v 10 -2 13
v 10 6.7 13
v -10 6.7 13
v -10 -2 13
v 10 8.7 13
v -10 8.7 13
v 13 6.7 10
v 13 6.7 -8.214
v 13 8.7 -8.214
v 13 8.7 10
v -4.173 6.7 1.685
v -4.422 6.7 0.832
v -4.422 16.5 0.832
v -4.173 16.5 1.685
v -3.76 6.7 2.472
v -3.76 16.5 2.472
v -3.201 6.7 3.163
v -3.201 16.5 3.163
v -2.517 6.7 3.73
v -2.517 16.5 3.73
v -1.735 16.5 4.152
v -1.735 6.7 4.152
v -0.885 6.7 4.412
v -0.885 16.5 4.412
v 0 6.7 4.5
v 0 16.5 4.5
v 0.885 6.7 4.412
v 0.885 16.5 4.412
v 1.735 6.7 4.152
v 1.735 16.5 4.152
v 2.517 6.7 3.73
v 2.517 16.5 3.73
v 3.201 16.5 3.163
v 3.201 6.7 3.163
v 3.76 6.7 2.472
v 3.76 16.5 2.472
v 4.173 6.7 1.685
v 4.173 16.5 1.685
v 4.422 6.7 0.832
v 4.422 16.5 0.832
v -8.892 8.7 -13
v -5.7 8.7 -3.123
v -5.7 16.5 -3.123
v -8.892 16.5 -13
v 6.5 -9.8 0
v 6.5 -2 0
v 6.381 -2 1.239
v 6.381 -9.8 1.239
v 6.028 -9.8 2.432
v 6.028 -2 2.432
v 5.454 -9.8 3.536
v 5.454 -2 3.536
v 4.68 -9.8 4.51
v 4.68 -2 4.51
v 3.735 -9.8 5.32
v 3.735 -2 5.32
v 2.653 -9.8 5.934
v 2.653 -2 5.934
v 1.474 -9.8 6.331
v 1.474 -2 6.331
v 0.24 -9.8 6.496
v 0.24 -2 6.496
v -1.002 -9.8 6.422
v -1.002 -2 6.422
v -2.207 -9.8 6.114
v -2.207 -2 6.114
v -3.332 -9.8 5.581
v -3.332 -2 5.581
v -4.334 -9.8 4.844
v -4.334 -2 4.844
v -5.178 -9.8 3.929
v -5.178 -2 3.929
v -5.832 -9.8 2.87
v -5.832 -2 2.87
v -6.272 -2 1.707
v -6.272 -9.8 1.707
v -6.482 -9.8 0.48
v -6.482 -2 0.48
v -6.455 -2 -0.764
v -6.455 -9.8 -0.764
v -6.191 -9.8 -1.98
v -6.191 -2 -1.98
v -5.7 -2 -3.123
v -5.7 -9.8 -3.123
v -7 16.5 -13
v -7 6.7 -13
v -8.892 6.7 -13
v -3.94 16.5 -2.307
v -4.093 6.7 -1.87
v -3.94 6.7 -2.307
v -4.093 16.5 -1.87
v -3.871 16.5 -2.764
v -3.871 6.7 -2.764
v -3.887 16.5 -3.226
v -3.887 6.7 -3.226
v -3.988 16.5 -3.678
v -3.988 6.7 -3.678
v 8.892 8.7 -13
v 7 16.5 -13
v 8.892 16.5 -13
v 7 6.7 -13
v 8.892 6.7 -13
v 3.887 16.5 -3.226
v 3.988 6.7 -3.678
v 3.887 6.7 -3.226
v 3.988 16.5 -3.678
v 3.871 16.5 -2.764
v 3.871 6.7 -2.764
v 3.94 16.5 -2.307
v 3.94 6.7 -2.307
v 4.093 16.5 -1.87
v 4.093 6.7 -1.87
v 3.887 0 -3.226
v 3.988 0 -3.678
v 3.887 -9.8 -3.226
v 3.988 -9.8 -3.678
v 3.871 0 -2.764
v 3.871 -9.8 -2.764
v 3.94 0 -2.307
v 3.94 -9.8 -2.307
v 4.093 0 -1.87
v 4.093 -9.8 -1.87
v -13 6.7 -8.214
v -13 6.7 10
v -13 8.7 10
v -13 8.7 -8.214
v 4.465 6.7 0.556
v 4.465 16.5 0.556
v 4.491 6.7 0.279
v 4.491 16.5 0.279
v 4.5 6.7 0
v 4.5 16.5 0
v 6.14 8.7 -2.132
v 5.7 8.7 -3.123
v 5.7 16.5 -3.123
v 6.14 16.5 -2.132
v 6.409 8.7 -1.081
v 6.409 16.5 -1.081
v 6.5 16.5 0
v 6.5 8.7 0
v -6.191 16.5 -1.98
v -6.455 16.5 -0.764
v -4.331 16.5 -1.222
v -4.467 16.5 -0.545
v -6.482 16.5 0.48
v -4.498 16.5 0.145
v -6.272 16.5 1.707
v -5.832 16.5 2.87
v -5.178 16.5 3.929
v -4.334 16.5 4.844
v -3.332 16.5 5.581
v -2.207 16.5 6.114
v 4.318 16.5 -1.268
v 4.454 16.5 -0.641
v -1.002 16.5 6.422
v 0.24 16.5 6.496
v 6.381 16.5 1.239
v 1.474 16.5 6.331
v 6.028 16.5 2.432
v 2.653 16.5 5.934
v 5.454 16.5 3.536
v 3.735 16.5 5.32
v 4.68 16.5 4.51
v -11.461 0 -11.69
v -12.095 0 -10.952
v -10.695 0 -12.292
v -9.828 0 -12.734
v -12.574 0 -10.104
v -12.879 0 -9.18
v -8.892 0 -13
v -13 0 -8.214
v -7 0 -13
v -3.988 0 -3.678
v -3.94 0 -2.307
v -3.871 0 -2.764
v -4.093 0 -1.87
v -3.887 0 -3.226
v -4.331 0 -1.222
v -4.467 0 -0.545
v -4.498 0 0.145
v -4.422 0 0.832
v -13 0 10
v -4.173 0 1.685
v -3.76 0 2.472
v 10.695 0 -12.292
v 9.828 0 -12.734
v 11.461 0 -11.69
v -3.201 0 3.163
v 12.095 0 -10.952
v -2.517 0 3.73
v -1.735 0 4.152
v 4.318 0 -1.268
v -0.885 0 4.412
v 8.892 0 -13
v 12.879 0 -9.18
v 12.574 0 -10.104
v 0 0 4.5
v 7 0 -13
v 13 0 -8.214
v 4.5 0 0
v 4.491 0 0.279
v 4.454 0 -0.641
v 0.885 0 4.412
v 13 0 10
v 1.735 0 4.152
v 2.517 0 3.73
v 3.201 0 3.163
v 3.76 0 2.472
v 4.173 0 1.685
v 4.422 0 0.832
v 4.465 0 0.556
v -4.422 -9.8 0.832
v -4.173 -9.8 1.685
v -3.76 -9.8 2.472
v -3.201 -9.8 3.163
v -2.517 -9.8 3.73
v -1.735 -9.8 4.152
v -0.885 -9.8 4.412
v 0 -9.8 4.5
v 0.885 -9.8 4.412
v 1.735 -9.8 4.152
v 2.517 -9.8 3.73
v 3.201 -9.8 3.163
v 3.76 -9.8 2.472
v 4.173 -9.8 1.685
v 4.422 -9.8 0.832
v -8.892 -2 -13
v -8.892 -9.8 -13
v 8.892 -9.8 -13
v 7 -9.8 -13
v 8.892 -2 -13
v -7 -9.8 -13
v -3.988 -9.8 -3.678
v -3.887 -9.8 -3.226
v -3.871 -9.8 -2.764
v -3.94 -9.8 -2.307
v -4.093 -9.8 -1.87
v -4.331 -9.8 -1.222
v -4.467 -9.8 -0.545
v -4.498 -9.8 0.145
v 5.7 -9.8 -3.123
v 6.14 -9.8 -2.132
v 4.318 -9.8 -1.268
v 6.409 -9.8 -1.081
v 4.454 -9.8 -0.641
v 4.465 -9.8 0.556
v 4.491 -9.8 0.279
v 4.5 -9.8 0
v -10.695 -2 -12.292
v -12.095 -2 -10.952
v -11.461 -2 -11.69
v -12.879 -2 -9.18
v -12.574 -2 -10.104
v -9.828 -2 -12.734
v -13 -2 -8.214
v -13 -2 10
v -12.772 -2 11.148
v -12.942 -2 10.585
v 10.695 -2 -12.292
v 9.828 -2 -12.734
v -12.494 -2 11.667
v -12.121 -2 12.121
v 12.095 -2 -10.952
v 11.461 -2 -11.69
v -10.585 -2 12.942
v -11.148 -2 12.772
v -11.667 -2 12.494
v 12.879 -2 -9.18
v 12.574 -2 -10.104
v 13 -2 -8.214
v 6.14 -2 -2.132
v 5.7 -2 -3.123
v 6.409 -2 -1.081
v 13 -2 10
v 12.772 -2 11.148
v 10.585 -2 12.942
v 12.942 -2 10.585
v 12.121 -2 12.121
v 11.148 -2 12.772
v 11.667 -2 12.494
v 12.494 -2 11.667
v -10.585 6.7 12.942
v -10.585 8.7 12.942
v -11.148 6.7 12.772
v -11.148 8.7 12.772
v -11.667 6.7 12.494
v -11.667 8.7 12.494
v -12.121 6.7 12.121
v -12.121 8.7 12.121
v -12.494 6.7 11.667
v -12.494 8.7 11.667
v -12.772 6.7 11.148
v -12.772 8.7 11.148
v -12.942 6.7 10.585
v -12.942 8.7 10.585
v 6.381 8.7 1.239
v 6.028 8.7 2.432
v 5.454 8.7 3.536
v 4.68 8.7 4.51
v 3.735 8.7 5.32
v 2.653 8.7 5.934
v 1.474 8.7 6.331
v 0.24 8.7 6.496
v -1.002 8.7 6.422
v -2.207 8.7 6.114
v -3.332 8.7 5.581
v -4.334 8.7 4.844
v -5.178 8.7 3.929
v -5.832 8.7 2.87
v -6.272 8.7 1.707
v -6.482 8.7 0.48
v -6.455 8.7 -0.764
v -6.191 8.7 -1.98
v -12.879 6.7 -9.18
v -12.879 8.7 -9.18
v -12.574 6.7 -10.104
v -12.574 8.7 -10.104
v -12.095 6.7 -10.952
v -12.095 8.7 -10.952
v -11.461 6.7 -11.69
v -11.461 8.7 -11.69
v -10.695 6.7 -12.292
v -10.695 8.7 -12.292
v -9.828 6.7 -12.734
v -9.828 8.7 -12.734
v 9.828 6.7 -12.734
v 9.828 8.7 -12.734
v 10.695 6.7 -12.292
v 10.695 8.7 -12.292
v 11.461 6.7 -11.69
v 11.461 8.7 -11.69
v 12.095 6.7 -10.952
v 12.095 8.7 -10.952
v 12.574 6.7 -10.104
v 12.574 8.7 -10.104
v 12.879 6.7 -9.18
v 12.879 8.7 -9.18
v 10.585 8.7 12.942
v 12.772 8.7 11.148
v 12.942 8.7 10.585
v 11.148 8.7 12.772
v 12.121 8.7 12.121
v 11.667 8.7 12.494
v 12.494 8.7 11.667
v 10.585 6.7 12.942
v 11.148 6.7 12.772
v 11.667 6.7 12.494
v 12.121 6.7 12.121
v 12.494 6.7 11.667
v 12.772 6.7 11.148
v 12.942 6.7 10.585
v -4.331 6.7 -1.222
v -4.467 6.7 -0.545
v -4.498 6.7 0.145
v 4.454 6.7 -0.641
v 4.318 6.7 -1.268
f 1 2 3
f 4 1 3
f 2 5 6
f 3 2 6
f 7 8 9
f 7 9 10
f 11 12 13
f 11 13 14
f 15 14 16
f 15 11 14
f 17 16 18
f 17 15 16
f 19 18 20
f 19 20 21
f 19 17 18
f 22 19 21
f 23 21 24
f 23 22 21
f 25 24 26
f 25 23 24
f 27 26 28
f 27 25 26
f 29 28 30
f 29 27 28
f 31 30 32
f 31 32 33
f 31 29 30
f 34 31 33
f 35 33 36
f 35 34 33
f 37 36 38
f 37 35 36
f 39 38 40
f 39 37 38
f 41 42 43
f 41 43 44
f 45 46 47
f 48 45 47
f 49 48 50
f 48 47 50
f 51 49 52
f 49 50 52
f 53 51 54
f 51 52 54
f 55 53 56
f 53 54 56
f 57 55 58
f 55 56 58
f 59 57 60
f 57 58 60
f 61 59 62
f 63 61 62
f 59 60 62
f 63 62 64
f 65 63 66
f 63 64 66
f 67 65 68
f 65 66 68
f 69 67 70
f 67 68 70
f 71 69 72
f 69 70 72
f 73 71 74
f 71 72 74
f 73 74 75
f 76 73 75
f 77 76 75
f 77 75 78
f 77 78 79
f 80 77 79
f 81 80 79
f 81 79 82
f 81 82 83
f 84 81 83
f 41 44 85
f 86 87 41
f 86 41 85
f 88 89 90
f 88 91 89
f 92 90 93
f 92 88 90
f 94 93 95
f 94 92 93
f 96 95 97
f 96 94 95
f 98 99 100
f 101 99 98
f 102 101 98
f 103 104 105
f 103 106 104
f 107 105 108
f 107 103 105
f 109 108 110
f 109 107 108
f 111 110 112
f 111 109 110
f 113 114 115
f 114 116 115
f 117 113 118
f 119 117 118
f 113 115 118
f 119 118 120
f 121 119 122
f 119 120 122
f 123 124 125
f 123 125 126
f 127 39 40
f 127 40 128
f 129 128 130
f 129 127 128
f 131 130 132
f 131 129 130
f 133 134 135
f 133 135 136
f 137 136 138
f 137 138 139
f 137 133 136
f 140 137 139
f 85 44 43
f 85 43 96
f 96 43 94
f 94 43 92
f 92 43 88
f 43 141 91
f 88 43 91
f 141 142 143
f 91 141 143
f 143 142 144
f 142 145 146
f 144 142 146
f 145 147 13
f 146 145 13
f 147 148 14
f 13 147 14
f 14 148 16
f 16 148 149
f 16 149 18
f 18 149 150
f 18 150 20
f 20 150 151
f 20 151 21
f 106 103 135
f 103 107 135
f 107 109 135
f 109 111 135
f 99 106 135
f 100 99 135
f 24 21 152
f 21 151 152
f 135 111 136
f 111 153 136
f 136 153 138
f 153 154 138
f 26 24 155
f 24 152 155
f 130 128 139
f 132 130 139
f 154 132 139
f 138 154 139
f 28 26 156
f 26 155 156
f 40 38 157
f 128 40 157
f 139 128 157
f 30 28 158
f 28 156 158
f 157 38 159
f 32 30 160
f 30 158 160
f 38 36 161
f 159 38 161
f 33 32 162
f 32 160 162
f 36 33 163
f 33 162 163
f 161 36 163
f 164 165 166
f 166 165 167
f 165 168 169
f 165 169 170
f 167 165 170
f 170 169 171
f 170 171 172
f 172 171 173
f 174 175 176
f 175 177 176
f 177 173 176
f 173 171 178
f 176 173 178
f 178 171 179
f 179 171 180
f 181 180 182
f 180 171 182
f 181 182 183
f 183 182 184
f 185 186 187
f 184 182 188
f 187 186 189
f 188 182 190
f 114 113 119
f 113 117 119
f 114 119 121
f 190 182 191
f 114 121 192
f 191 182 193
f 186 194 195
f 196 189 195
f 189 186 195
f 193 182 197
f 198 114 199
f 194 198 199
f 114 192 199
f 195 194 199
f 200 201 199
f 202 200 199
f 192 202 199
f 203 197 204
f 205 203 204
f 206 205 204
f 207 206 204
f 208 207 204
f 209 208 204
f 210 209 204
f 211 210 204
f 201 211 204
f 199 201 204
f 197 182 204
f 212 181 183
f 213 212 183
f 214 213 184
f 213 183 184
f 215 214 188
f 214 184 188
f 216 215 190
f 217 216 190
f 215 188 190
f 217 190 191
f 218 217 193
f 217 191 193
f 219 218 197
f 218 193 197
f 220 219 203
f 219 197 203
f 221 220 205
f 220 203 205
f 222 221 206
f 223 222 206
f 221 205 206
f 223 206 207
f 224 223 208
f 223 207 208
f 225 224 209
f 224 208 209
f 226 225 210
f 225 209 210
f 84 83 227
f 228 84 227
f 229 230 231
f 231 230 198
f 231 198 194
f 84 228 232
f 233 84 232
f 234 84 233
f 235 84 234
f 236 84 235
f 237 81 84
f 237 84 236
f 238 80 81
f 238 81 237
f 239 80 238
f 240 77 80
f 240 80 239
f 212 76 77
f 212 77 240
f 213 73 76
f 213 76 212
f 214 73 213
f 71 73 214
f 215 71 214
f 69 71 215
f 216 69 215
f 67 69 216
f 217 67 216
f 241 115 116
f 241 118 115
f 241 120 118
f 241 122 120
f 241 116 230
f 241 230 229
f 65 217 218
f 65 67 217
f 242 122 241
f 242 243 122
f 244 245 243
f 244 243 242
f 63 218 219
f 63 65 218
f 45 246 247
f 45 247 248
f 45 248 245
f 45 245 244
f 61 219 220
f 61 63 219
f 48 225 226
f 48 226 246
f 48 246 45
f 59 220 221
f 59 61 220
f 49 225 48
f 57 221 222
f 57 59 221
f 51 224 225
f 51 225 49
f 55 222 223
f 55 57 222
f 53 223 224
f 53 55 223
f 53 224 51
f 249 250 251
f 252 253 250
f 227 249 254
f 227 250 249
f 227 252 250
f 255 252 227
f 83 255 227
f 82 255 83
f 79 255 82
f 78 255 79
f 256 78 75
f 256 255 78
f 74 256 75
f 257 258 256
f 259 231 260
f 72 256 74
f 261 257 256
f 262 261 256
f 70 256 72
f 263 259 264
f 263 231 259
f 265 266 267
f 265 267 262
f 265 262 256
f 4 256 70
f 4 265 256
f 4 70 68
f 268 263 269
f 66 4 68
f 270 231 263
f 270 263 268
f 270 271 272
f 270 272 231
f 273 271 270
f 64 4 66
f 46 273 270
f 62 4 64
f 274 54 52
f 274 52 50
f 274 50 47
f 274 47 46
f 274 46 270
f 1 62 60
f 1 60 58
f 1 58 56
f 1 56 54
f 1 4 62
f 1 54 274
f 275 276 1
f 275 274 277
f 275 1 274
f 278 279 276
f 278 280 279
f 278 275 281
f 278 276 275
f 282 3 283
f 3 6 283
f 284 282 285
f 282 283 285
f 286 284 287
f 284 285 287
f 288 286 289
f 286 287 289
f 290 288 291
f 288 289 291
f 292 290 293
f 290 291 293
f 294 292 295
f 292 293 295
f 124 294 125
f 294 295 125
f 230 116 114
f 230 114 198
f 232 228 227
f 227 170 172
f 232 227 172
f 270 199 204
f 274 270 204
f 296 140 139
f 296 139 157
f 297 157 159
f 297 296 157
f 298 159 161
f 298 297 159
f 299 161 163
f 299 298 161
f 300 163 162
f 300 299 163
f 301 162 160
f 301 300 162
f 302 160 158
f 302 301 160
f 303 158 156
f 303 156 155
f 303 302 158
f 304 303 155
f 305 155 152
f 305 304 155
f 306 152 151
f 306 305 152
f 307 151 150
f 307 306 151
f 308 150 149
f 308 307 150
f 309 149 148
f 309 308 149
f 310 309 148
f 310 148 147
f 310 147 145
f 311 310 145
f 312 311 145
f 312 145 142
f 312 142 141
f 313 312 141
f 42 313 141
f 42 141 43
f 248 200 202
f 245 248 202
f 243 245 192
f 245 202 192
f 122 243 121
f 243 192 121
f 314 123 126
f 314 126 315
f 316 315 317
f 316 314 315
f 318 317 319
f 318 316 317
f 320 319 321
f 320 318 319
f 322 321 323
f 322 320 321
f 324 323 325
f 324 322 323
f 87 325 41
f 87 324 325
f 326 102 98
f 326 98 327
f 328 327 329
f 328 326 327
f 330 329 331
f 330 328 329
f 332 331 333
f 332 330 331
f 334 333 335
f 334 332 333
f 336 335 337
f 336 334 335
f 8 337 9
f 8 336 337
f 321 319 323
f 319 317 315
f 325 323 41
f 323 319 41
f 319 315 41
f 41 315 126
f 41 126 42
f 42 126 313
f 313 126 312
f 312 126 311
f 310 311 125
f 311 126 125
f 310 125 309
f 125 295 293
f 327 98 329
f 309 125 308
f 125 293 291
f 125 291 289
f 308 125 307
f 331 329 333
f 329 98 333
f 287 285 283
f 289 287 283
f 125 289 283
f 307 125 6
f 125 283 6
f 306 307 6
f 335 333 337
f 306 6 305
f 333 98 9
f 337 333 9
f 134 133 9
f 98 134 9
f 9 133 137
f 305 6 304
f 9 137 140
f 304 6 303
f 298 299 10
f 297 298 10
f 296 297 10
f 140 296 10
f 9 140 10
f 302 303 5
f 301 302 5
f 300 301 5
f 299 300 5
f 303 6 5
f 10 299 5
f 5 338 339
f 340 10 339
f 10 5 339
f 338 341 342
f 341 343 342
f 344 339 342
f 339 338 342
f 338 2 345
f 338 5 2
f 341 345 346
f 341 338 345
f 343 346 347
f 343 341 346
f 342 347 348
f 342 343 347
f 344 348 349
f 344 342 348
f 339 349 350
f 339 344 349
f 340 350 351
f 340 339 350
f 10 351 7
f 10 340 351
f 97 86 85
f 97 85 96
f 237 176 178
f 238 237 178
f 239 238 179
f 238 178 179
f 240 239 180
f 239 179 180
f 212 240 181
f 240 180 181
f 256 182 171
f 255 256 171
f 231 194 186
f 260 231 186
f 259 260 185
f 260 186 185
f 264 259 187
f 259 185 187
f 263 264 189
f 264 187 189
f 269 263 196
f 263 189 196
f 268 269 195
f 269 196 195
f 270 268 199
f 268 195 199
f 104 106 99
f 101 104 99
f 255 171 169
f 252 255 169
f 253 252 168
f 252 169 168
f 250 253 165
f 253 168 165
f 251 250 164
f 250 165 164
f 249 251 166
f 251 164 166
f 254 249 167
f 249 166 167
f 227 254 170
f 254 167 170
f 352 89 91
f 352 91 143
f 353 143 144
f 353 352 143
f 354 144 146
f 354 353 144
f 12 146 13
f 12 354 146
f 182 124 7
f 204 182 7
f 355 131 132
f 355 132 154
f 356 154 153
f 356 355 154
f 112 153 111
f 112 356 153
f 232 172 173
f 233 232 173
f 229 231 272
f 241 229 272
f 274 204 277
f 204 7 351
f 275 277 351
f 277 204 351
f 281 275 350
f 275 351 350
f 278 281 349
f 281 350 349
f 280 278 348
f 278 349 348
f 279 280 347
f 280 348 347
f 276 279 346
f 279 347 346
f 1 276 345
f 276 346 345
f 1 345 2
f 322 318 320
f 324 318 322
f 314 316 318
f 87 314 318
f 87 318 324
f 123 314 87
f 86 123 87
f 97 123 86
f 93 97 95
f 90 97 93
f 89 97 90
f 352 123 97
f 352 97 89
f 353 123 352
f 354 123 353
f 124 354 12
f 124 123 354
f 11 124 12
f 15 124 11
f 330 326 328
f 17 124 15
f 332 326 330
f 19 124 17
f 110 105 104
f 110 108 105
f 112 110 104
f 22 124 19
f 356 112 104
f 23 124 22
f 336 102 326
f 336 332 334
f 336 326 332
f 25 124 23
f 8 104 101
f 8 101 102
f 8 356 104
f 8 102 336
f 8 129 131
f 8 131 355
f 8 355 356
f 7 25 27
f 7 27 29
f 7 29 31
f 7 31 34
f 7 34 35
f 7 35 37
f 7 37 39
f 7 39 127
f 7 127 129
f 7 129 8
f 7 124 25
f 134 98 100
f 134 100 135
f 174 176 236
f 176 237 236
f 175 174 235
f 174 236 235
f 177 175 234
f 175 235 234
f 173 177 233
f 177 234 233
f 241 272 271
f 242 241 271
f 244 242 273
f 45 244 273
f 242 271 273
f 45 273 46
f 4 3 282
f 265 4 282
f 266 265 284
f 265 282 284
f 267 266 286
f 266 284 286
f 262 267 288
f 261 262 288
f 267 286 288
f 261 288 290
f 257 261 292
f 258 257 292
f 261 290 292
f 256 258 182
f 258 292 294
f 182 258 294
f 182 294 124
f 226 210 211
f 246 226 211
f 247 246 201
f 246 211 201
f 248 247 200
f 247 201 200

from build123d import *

# Parameters (mm, degrees)
F1_DEPTH = 9.8
F2_DEPTH = 2
F3_R     = 3
F5_DEPTH = 3.35
F7_R     = 2.5


with BuildPart() as f1:
    # F0 (on Front) → F1 (new body)
    with BuildSketch(Plane.XZ):
        with BuildLine():
            ThreePointArc((6.5, 0), (-1.6120548351, 6.2969261714), (-5.7003936026, -3.1233816249))
            Line((-5.7003936026, -3.1233816249), (-4.4224832798, 0.8316499504))
            ThreePointArc((-4.4224832798, 0.8316499504), (0, 4.5), (4.4224832798, 0.8316499504))
            Line((4.4224832798, 0.8316499504), (5.7003936026, -3.1233816249))
            ThreePointArc((5.7003936026, -3.1233816249), (6.2969261714, -1.6120548351), (6.5, 0))
        make_face()
        with BuildLine():
            Line((-4.4224832798, 0.8316499504), (-5.7003936026, -3.1233816249))
            ThreePointArc((-5.7003936026, -3.1233816249), (-5.1003989607, -4.0293833824), (-4.3578547765, -4.8227690953))
            Line((-4.3578547765, -4.8227690953), (-3.65, -2.6320144377))
            ThreePointArc((-3.65, -2.6320144377), (-4.3920939566, -0.9795461582), (-4.4224832798, 0.8316499504))
        make_face()
        with BuildLine():
            Line((-5.7003936026, -3.1233816249), (-8.891627942, -13))
            Line((-8.891627942, -13), (-7, -13))
            Line((-7, -13), (-4.3578547765, -4.8227690953))
            ThreePointArc((-4.3578547765, -4.8227690953), (-5.1003989607, -4.0293833824), (-5.7003936026, -3.1233816249))
        make_face()
        with BuildLine():
            Line((7, -13), (8.891627942, -13))
            Line((8.891627942, -13), (5.7003936026, -3.1233816249))
            ThreePointArc((5.7003936026, -3.1233816249), (5.1003989607, -4.0293833824), (4.3578547765, -4.8227690953))
            Line((4.3578547765, -4.8227690953), (7, -13))
        make_face()
        with BuildLine():
            ThreePointArc((4.3578547765, -4.8227690953), (5.1003989607, -4.0293833824), (5.7003936026, -3.1233816249))
            Line((5.7003936026, -3.1233816249), (4.4224832798, 0.8316499504))
            ThreePointArc((4.4224832798, 0.8316499504), (4.4805789112, 0.4176273704), (4.5, 0))
            ThreePointArc((4.5, 0), (4.2822307271, -1.3829316686), (3.65, -2.6320144377))
            Line((3.65, -2.6320144377), (4.3578547765, -4.8227690953))
        make_face()
    extrude(amount=F1_DEPTH)

    # F0 (on Front) → F2 (join)
    with BuildSketch(Plane.XZ):
        with BuildLine():
            Line((13, 13), (-13, 13))
            Line((-13, 13), (-13, -8.2140415907))
            ThreePointArc((-13, -8.2140415907), (-11.7956860143, -11.3365696666), (-8.891627942, -13))
            Line((-8.891627942, -13), (-5.7003936026, -3.1233816249))
            ThreePointArc((-5.7003936026, -3.1233816249), (-1.6120548351, 6.2969261714), (6.5, 0))
            ThreePointArc((6.5, 0), (6.2969261714, -1.6120548351), (5.7003936026, -3.1233816249))
            Line((5.7003936026, -3.1233816249), (8.891627942, -13))
            ThreePointArc((8.891627942, -13), (11.7956860143, -11.3365696666), (13, -8.2140415907))
            Line((13, -8.2140415907), (13, 13))
        make_face()
    extrude(amount=F2_DEPTH)

    # F3
    f3_edges = [f1.edges().sort_by_distance(p)[0] for p in [
        (-13, -1, 13),
        (13, -1, 13),
    ]]
    fillet(f3_edges, radius=F3_R)

    # F4 (on face) → F5 (join)
    with BuildSketch(Plane.XZ):
        with BuildLine():
            ThreePointArc((13, 10), (12.1213203436, 12.1213203436), (10, 13))
            Line((10, 13), (-10, 13))
            ThreePointArc((-10, 13), (-12.1213203436, 12.1213203436), (-13, 10))
            Line((-13, 10), (13, 10))
        make_face()
    extrude(amount=-F5_DEPTH)

    # F6: F1 across face


with BuildPart() as f1_1:
    add(f1.part)
    add(f1.part.mirror(Plane(origin=(0, 3.35, 11.4567592), x_dir=(1, 0, 0), z_dir=(0, 1, 0))))

    # F7
    f7_edges = [f1_1.edges().sort_by_distance(p)[0] for p in [
        (-3.65, -4.9, -2.632014),
        (-3.65, 11.6, -2.632014),
        (3.65, 11.6, -2.632014),
        (3.65, -4.9, -2.632014),
    ]]
    fillet(f7_edges, radius=F7_R)


solid = f1_1.part
